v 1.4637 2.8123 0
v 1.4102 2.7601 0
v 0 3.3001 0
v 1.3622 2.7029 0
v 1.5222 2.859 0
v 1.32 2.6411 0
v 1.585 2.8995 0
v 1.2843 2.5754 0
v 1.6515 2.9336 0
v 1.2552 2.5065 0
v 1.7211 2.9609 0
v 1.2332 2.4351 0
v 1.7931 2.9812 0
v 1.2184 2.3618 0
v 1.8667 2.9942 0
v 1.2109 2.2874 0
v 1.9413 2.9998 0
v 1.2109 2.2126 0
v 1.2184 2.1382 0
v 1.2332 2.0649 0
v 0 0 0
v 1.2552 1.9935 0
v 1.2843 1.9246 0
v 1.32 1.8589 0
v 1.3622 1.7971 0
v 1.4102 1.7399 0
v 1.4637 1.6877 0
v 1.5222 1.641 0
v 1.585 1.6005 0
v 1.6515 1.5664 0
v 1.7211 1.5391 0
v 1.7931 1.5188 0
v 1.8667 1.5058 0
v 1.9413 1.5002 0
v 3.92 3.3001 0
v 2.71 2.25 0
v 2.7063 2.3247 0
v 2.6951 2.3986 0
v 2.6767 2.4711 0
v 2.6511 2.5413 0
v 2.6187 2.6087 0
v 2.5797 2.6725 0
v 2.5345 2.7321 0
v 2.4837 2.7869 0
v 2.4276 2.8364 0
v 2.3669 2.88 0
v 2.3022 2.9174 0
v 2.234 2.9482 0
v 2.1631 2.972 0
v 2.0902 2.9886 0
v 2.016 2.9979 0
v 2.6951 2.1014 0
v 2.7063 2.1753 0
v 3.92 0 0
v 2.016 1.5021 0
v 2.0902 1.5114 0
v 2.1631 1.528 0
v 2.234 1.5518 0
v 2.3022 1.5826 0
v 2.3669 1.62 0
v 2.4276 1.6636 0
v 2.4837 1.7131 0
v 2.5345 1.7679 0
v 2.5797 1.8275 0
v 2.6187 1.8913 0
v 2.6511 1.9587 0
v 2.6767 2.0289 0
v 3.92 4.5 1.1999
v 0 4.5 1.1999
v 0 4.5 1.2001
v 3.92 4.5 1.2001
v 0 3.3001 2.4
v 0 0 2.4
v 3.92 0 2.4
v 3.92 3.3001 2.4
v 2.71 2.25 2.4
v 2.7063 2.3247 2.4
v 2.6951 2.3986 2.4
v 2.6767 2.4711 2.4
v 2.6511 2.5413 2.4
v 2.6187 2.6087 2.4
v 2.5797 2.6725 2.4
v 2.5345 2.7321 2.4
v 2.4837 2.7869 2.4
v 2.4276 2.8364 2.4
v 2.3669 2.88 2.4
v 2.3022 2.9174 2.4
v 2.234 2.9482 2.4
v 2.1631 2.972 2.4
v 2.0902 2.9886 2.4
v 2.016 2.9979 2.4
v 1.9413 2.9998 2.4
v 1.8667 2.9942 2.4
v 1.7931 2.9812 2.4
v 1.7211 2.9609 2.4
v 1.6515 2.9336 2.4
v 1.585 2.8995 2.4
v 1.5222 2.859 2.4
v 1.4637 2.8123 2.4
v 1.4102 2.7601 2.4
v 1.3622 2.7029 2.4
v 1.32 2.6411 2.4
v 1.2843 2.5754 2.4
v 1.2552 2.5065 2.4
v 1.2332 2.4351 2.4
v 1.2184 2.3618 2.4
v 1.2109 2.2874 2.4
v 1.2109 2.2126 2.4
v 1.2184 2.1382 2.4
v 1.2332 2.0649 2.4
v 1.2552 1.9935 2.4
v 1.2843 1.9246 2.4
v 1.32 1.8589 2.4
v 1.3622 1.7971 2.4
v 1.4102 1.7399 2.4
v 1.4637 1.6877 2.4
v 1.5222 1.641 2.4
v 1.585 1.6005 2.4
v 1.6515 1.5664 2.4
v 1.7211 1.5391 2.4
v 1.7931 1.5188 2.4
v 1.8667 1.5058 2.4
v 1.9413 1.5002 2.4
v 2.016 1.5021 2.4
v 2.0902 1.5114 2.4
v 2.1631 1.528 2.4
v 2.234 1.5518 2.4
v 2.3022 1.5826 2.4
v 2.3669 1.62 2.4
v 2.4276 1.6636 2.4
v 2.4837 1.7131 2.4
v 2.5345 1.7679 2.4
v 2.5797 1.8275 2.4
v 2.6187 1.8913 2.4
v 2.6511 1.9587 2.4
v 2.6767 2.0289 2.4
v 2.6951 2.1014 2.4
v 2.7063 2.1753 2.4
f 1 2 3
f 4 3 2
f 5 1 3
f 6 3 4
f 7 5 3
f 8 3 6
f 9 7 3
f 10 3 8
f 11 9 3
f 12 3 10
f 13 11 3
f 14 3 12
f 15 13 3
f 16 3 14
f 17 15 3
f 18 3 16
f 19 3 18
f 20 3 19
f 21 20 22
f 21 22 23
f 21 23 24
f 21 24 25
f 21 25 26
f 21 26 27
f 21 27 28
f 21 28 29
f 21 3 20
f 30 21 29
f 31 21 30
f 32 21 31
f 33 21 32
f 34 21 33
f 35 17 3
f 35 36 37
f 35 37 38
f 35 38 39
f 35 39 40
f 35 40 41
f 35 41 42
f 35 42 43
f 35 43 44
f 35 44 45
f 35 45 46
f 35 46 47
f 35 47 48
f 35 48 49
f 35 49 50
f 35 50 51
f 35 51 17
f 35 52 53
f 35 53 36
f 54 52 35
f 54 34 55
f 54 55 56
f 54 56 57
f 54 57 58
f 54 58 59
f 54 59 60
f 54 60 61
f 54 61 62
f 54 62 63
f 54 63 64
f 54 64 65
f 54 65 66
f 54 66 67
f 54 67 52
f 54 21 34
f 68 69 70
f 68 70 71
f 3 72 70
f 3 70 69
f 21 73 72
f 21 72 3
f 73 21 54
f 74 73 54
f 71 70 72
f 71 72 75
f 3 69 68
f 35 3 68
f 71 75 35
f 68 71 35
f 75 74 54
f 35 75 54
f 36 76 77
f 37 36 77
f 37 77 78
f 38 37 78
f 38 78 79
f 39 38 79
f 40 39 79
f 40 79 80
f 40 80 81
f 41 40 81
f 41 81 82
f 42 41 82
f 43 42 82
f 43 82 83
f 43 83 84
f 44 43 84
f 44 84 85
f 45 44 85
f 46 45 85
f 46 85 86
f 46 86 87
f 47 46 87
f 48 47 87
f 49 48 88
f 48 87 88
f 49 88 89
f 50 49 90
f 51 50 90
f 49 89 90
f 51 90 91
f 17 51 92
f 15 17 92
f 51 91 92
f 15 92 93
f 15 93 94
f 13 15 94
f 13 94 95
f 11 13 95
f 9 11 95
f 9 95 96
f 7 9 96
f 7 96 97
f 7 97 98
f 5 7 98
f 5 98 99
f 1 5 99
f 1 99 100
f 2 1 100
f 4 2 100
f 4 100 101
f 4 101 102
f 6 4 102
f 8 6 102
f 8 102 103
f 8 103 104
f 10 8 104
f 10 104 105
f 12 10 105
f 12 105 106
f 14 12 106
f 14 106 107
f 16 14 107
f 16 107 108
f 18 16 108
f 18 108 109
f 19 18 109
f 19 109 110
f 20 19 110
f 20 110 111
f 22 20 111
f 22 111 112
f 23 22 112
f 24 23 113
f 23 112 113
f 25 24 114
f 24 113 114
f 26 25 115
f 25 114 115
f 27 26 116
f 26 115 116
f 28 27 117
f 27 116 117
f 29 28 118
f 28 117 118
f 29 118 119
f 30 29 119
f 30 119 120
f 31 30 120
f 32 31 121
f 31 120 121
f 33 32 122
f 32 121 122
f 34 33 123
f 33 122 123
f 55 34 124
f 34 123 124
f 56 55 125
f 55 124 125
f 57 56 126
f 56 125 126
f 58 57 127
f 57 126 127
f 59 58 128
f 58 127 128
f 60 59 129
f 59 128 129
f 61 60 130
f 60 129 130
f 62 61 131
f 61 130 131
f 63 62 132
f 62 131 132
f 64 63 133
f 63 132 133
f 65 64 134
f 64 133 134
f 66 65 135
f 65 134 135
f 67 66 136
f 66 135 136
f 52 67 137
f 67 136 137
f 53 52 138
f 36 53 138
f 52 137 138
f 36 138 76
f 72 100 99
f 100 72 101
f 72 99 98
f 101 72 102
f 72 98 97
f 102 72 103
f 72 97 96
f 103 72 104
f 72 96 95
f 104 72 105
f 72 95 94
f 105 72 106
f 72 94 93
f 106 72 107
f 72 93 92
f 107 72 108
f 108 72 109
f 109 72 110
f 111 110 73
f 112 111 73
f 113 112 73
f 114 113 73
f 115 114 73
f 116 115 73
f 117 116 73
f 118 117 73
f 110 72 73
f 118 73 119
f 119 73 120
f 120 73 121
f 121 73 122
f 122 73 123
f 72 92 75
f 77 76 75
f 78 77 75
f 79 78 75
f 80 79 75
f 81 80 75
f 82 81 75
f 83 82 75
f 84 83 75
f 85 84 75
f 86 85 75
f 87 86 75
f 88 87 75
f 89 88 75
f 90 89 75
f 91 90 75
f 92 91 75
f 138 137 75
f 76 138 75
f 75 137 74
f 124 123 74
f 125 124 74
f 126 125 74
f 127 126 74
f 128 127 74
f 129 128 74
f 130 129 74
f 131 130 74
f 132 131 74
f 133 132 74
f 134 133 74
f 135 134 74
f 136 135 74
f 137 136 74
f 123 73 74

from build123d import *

# Parameters (mm, degrees)
SKETCH_1_W          = 3.92
SKETCH_1_H          = 2.4
EXTRUDE_1_DEPTH     = 4.5
SKETCH_2_R          = 0.75
CUT_EXTRUDE_1_DEPTH = 4.5
CHAMFER_1_SIZE      = 1.2


with BuildPart() as part:
    # 草图1 → 凸台-拉伸1 (new body)
    with BuildSketch(Plane(origin=(0, 0, 0), x_dir=(1, 0, 0), z_dir=(0, 1, 0))):
        with Locations((1.96, -1.2)):
            Rectangle(SKETCH_1_W, SKETCH_1_H)
    extrude(amount=EXTRUDE_1_DEPTH)

    # 草图2 → 切除-拉伸1 (cut)
    with BuildSketch(Plane.XY.offset(2.4)):
        with Locations((1.96, 2.25)):
            Circle(SKETCH_2_R)
    extrude(amount=-CUT_EXTRUDE_1_DEPTH, mode=Mode.SUBTRACT)

    # 倒角1
    chamfer_1_edges = [part.edges().sort_by_distance(p)[0] for p in [
        (1.96, 4.5, 0),
        (1.96, 4.5, 2.4),
    ]]
    chamfer(chamfer_1_edges, length=CHAMFER_1_SIZE - 0.0001)  # a hair under: the kernel refuses the full size


solid = part.part
